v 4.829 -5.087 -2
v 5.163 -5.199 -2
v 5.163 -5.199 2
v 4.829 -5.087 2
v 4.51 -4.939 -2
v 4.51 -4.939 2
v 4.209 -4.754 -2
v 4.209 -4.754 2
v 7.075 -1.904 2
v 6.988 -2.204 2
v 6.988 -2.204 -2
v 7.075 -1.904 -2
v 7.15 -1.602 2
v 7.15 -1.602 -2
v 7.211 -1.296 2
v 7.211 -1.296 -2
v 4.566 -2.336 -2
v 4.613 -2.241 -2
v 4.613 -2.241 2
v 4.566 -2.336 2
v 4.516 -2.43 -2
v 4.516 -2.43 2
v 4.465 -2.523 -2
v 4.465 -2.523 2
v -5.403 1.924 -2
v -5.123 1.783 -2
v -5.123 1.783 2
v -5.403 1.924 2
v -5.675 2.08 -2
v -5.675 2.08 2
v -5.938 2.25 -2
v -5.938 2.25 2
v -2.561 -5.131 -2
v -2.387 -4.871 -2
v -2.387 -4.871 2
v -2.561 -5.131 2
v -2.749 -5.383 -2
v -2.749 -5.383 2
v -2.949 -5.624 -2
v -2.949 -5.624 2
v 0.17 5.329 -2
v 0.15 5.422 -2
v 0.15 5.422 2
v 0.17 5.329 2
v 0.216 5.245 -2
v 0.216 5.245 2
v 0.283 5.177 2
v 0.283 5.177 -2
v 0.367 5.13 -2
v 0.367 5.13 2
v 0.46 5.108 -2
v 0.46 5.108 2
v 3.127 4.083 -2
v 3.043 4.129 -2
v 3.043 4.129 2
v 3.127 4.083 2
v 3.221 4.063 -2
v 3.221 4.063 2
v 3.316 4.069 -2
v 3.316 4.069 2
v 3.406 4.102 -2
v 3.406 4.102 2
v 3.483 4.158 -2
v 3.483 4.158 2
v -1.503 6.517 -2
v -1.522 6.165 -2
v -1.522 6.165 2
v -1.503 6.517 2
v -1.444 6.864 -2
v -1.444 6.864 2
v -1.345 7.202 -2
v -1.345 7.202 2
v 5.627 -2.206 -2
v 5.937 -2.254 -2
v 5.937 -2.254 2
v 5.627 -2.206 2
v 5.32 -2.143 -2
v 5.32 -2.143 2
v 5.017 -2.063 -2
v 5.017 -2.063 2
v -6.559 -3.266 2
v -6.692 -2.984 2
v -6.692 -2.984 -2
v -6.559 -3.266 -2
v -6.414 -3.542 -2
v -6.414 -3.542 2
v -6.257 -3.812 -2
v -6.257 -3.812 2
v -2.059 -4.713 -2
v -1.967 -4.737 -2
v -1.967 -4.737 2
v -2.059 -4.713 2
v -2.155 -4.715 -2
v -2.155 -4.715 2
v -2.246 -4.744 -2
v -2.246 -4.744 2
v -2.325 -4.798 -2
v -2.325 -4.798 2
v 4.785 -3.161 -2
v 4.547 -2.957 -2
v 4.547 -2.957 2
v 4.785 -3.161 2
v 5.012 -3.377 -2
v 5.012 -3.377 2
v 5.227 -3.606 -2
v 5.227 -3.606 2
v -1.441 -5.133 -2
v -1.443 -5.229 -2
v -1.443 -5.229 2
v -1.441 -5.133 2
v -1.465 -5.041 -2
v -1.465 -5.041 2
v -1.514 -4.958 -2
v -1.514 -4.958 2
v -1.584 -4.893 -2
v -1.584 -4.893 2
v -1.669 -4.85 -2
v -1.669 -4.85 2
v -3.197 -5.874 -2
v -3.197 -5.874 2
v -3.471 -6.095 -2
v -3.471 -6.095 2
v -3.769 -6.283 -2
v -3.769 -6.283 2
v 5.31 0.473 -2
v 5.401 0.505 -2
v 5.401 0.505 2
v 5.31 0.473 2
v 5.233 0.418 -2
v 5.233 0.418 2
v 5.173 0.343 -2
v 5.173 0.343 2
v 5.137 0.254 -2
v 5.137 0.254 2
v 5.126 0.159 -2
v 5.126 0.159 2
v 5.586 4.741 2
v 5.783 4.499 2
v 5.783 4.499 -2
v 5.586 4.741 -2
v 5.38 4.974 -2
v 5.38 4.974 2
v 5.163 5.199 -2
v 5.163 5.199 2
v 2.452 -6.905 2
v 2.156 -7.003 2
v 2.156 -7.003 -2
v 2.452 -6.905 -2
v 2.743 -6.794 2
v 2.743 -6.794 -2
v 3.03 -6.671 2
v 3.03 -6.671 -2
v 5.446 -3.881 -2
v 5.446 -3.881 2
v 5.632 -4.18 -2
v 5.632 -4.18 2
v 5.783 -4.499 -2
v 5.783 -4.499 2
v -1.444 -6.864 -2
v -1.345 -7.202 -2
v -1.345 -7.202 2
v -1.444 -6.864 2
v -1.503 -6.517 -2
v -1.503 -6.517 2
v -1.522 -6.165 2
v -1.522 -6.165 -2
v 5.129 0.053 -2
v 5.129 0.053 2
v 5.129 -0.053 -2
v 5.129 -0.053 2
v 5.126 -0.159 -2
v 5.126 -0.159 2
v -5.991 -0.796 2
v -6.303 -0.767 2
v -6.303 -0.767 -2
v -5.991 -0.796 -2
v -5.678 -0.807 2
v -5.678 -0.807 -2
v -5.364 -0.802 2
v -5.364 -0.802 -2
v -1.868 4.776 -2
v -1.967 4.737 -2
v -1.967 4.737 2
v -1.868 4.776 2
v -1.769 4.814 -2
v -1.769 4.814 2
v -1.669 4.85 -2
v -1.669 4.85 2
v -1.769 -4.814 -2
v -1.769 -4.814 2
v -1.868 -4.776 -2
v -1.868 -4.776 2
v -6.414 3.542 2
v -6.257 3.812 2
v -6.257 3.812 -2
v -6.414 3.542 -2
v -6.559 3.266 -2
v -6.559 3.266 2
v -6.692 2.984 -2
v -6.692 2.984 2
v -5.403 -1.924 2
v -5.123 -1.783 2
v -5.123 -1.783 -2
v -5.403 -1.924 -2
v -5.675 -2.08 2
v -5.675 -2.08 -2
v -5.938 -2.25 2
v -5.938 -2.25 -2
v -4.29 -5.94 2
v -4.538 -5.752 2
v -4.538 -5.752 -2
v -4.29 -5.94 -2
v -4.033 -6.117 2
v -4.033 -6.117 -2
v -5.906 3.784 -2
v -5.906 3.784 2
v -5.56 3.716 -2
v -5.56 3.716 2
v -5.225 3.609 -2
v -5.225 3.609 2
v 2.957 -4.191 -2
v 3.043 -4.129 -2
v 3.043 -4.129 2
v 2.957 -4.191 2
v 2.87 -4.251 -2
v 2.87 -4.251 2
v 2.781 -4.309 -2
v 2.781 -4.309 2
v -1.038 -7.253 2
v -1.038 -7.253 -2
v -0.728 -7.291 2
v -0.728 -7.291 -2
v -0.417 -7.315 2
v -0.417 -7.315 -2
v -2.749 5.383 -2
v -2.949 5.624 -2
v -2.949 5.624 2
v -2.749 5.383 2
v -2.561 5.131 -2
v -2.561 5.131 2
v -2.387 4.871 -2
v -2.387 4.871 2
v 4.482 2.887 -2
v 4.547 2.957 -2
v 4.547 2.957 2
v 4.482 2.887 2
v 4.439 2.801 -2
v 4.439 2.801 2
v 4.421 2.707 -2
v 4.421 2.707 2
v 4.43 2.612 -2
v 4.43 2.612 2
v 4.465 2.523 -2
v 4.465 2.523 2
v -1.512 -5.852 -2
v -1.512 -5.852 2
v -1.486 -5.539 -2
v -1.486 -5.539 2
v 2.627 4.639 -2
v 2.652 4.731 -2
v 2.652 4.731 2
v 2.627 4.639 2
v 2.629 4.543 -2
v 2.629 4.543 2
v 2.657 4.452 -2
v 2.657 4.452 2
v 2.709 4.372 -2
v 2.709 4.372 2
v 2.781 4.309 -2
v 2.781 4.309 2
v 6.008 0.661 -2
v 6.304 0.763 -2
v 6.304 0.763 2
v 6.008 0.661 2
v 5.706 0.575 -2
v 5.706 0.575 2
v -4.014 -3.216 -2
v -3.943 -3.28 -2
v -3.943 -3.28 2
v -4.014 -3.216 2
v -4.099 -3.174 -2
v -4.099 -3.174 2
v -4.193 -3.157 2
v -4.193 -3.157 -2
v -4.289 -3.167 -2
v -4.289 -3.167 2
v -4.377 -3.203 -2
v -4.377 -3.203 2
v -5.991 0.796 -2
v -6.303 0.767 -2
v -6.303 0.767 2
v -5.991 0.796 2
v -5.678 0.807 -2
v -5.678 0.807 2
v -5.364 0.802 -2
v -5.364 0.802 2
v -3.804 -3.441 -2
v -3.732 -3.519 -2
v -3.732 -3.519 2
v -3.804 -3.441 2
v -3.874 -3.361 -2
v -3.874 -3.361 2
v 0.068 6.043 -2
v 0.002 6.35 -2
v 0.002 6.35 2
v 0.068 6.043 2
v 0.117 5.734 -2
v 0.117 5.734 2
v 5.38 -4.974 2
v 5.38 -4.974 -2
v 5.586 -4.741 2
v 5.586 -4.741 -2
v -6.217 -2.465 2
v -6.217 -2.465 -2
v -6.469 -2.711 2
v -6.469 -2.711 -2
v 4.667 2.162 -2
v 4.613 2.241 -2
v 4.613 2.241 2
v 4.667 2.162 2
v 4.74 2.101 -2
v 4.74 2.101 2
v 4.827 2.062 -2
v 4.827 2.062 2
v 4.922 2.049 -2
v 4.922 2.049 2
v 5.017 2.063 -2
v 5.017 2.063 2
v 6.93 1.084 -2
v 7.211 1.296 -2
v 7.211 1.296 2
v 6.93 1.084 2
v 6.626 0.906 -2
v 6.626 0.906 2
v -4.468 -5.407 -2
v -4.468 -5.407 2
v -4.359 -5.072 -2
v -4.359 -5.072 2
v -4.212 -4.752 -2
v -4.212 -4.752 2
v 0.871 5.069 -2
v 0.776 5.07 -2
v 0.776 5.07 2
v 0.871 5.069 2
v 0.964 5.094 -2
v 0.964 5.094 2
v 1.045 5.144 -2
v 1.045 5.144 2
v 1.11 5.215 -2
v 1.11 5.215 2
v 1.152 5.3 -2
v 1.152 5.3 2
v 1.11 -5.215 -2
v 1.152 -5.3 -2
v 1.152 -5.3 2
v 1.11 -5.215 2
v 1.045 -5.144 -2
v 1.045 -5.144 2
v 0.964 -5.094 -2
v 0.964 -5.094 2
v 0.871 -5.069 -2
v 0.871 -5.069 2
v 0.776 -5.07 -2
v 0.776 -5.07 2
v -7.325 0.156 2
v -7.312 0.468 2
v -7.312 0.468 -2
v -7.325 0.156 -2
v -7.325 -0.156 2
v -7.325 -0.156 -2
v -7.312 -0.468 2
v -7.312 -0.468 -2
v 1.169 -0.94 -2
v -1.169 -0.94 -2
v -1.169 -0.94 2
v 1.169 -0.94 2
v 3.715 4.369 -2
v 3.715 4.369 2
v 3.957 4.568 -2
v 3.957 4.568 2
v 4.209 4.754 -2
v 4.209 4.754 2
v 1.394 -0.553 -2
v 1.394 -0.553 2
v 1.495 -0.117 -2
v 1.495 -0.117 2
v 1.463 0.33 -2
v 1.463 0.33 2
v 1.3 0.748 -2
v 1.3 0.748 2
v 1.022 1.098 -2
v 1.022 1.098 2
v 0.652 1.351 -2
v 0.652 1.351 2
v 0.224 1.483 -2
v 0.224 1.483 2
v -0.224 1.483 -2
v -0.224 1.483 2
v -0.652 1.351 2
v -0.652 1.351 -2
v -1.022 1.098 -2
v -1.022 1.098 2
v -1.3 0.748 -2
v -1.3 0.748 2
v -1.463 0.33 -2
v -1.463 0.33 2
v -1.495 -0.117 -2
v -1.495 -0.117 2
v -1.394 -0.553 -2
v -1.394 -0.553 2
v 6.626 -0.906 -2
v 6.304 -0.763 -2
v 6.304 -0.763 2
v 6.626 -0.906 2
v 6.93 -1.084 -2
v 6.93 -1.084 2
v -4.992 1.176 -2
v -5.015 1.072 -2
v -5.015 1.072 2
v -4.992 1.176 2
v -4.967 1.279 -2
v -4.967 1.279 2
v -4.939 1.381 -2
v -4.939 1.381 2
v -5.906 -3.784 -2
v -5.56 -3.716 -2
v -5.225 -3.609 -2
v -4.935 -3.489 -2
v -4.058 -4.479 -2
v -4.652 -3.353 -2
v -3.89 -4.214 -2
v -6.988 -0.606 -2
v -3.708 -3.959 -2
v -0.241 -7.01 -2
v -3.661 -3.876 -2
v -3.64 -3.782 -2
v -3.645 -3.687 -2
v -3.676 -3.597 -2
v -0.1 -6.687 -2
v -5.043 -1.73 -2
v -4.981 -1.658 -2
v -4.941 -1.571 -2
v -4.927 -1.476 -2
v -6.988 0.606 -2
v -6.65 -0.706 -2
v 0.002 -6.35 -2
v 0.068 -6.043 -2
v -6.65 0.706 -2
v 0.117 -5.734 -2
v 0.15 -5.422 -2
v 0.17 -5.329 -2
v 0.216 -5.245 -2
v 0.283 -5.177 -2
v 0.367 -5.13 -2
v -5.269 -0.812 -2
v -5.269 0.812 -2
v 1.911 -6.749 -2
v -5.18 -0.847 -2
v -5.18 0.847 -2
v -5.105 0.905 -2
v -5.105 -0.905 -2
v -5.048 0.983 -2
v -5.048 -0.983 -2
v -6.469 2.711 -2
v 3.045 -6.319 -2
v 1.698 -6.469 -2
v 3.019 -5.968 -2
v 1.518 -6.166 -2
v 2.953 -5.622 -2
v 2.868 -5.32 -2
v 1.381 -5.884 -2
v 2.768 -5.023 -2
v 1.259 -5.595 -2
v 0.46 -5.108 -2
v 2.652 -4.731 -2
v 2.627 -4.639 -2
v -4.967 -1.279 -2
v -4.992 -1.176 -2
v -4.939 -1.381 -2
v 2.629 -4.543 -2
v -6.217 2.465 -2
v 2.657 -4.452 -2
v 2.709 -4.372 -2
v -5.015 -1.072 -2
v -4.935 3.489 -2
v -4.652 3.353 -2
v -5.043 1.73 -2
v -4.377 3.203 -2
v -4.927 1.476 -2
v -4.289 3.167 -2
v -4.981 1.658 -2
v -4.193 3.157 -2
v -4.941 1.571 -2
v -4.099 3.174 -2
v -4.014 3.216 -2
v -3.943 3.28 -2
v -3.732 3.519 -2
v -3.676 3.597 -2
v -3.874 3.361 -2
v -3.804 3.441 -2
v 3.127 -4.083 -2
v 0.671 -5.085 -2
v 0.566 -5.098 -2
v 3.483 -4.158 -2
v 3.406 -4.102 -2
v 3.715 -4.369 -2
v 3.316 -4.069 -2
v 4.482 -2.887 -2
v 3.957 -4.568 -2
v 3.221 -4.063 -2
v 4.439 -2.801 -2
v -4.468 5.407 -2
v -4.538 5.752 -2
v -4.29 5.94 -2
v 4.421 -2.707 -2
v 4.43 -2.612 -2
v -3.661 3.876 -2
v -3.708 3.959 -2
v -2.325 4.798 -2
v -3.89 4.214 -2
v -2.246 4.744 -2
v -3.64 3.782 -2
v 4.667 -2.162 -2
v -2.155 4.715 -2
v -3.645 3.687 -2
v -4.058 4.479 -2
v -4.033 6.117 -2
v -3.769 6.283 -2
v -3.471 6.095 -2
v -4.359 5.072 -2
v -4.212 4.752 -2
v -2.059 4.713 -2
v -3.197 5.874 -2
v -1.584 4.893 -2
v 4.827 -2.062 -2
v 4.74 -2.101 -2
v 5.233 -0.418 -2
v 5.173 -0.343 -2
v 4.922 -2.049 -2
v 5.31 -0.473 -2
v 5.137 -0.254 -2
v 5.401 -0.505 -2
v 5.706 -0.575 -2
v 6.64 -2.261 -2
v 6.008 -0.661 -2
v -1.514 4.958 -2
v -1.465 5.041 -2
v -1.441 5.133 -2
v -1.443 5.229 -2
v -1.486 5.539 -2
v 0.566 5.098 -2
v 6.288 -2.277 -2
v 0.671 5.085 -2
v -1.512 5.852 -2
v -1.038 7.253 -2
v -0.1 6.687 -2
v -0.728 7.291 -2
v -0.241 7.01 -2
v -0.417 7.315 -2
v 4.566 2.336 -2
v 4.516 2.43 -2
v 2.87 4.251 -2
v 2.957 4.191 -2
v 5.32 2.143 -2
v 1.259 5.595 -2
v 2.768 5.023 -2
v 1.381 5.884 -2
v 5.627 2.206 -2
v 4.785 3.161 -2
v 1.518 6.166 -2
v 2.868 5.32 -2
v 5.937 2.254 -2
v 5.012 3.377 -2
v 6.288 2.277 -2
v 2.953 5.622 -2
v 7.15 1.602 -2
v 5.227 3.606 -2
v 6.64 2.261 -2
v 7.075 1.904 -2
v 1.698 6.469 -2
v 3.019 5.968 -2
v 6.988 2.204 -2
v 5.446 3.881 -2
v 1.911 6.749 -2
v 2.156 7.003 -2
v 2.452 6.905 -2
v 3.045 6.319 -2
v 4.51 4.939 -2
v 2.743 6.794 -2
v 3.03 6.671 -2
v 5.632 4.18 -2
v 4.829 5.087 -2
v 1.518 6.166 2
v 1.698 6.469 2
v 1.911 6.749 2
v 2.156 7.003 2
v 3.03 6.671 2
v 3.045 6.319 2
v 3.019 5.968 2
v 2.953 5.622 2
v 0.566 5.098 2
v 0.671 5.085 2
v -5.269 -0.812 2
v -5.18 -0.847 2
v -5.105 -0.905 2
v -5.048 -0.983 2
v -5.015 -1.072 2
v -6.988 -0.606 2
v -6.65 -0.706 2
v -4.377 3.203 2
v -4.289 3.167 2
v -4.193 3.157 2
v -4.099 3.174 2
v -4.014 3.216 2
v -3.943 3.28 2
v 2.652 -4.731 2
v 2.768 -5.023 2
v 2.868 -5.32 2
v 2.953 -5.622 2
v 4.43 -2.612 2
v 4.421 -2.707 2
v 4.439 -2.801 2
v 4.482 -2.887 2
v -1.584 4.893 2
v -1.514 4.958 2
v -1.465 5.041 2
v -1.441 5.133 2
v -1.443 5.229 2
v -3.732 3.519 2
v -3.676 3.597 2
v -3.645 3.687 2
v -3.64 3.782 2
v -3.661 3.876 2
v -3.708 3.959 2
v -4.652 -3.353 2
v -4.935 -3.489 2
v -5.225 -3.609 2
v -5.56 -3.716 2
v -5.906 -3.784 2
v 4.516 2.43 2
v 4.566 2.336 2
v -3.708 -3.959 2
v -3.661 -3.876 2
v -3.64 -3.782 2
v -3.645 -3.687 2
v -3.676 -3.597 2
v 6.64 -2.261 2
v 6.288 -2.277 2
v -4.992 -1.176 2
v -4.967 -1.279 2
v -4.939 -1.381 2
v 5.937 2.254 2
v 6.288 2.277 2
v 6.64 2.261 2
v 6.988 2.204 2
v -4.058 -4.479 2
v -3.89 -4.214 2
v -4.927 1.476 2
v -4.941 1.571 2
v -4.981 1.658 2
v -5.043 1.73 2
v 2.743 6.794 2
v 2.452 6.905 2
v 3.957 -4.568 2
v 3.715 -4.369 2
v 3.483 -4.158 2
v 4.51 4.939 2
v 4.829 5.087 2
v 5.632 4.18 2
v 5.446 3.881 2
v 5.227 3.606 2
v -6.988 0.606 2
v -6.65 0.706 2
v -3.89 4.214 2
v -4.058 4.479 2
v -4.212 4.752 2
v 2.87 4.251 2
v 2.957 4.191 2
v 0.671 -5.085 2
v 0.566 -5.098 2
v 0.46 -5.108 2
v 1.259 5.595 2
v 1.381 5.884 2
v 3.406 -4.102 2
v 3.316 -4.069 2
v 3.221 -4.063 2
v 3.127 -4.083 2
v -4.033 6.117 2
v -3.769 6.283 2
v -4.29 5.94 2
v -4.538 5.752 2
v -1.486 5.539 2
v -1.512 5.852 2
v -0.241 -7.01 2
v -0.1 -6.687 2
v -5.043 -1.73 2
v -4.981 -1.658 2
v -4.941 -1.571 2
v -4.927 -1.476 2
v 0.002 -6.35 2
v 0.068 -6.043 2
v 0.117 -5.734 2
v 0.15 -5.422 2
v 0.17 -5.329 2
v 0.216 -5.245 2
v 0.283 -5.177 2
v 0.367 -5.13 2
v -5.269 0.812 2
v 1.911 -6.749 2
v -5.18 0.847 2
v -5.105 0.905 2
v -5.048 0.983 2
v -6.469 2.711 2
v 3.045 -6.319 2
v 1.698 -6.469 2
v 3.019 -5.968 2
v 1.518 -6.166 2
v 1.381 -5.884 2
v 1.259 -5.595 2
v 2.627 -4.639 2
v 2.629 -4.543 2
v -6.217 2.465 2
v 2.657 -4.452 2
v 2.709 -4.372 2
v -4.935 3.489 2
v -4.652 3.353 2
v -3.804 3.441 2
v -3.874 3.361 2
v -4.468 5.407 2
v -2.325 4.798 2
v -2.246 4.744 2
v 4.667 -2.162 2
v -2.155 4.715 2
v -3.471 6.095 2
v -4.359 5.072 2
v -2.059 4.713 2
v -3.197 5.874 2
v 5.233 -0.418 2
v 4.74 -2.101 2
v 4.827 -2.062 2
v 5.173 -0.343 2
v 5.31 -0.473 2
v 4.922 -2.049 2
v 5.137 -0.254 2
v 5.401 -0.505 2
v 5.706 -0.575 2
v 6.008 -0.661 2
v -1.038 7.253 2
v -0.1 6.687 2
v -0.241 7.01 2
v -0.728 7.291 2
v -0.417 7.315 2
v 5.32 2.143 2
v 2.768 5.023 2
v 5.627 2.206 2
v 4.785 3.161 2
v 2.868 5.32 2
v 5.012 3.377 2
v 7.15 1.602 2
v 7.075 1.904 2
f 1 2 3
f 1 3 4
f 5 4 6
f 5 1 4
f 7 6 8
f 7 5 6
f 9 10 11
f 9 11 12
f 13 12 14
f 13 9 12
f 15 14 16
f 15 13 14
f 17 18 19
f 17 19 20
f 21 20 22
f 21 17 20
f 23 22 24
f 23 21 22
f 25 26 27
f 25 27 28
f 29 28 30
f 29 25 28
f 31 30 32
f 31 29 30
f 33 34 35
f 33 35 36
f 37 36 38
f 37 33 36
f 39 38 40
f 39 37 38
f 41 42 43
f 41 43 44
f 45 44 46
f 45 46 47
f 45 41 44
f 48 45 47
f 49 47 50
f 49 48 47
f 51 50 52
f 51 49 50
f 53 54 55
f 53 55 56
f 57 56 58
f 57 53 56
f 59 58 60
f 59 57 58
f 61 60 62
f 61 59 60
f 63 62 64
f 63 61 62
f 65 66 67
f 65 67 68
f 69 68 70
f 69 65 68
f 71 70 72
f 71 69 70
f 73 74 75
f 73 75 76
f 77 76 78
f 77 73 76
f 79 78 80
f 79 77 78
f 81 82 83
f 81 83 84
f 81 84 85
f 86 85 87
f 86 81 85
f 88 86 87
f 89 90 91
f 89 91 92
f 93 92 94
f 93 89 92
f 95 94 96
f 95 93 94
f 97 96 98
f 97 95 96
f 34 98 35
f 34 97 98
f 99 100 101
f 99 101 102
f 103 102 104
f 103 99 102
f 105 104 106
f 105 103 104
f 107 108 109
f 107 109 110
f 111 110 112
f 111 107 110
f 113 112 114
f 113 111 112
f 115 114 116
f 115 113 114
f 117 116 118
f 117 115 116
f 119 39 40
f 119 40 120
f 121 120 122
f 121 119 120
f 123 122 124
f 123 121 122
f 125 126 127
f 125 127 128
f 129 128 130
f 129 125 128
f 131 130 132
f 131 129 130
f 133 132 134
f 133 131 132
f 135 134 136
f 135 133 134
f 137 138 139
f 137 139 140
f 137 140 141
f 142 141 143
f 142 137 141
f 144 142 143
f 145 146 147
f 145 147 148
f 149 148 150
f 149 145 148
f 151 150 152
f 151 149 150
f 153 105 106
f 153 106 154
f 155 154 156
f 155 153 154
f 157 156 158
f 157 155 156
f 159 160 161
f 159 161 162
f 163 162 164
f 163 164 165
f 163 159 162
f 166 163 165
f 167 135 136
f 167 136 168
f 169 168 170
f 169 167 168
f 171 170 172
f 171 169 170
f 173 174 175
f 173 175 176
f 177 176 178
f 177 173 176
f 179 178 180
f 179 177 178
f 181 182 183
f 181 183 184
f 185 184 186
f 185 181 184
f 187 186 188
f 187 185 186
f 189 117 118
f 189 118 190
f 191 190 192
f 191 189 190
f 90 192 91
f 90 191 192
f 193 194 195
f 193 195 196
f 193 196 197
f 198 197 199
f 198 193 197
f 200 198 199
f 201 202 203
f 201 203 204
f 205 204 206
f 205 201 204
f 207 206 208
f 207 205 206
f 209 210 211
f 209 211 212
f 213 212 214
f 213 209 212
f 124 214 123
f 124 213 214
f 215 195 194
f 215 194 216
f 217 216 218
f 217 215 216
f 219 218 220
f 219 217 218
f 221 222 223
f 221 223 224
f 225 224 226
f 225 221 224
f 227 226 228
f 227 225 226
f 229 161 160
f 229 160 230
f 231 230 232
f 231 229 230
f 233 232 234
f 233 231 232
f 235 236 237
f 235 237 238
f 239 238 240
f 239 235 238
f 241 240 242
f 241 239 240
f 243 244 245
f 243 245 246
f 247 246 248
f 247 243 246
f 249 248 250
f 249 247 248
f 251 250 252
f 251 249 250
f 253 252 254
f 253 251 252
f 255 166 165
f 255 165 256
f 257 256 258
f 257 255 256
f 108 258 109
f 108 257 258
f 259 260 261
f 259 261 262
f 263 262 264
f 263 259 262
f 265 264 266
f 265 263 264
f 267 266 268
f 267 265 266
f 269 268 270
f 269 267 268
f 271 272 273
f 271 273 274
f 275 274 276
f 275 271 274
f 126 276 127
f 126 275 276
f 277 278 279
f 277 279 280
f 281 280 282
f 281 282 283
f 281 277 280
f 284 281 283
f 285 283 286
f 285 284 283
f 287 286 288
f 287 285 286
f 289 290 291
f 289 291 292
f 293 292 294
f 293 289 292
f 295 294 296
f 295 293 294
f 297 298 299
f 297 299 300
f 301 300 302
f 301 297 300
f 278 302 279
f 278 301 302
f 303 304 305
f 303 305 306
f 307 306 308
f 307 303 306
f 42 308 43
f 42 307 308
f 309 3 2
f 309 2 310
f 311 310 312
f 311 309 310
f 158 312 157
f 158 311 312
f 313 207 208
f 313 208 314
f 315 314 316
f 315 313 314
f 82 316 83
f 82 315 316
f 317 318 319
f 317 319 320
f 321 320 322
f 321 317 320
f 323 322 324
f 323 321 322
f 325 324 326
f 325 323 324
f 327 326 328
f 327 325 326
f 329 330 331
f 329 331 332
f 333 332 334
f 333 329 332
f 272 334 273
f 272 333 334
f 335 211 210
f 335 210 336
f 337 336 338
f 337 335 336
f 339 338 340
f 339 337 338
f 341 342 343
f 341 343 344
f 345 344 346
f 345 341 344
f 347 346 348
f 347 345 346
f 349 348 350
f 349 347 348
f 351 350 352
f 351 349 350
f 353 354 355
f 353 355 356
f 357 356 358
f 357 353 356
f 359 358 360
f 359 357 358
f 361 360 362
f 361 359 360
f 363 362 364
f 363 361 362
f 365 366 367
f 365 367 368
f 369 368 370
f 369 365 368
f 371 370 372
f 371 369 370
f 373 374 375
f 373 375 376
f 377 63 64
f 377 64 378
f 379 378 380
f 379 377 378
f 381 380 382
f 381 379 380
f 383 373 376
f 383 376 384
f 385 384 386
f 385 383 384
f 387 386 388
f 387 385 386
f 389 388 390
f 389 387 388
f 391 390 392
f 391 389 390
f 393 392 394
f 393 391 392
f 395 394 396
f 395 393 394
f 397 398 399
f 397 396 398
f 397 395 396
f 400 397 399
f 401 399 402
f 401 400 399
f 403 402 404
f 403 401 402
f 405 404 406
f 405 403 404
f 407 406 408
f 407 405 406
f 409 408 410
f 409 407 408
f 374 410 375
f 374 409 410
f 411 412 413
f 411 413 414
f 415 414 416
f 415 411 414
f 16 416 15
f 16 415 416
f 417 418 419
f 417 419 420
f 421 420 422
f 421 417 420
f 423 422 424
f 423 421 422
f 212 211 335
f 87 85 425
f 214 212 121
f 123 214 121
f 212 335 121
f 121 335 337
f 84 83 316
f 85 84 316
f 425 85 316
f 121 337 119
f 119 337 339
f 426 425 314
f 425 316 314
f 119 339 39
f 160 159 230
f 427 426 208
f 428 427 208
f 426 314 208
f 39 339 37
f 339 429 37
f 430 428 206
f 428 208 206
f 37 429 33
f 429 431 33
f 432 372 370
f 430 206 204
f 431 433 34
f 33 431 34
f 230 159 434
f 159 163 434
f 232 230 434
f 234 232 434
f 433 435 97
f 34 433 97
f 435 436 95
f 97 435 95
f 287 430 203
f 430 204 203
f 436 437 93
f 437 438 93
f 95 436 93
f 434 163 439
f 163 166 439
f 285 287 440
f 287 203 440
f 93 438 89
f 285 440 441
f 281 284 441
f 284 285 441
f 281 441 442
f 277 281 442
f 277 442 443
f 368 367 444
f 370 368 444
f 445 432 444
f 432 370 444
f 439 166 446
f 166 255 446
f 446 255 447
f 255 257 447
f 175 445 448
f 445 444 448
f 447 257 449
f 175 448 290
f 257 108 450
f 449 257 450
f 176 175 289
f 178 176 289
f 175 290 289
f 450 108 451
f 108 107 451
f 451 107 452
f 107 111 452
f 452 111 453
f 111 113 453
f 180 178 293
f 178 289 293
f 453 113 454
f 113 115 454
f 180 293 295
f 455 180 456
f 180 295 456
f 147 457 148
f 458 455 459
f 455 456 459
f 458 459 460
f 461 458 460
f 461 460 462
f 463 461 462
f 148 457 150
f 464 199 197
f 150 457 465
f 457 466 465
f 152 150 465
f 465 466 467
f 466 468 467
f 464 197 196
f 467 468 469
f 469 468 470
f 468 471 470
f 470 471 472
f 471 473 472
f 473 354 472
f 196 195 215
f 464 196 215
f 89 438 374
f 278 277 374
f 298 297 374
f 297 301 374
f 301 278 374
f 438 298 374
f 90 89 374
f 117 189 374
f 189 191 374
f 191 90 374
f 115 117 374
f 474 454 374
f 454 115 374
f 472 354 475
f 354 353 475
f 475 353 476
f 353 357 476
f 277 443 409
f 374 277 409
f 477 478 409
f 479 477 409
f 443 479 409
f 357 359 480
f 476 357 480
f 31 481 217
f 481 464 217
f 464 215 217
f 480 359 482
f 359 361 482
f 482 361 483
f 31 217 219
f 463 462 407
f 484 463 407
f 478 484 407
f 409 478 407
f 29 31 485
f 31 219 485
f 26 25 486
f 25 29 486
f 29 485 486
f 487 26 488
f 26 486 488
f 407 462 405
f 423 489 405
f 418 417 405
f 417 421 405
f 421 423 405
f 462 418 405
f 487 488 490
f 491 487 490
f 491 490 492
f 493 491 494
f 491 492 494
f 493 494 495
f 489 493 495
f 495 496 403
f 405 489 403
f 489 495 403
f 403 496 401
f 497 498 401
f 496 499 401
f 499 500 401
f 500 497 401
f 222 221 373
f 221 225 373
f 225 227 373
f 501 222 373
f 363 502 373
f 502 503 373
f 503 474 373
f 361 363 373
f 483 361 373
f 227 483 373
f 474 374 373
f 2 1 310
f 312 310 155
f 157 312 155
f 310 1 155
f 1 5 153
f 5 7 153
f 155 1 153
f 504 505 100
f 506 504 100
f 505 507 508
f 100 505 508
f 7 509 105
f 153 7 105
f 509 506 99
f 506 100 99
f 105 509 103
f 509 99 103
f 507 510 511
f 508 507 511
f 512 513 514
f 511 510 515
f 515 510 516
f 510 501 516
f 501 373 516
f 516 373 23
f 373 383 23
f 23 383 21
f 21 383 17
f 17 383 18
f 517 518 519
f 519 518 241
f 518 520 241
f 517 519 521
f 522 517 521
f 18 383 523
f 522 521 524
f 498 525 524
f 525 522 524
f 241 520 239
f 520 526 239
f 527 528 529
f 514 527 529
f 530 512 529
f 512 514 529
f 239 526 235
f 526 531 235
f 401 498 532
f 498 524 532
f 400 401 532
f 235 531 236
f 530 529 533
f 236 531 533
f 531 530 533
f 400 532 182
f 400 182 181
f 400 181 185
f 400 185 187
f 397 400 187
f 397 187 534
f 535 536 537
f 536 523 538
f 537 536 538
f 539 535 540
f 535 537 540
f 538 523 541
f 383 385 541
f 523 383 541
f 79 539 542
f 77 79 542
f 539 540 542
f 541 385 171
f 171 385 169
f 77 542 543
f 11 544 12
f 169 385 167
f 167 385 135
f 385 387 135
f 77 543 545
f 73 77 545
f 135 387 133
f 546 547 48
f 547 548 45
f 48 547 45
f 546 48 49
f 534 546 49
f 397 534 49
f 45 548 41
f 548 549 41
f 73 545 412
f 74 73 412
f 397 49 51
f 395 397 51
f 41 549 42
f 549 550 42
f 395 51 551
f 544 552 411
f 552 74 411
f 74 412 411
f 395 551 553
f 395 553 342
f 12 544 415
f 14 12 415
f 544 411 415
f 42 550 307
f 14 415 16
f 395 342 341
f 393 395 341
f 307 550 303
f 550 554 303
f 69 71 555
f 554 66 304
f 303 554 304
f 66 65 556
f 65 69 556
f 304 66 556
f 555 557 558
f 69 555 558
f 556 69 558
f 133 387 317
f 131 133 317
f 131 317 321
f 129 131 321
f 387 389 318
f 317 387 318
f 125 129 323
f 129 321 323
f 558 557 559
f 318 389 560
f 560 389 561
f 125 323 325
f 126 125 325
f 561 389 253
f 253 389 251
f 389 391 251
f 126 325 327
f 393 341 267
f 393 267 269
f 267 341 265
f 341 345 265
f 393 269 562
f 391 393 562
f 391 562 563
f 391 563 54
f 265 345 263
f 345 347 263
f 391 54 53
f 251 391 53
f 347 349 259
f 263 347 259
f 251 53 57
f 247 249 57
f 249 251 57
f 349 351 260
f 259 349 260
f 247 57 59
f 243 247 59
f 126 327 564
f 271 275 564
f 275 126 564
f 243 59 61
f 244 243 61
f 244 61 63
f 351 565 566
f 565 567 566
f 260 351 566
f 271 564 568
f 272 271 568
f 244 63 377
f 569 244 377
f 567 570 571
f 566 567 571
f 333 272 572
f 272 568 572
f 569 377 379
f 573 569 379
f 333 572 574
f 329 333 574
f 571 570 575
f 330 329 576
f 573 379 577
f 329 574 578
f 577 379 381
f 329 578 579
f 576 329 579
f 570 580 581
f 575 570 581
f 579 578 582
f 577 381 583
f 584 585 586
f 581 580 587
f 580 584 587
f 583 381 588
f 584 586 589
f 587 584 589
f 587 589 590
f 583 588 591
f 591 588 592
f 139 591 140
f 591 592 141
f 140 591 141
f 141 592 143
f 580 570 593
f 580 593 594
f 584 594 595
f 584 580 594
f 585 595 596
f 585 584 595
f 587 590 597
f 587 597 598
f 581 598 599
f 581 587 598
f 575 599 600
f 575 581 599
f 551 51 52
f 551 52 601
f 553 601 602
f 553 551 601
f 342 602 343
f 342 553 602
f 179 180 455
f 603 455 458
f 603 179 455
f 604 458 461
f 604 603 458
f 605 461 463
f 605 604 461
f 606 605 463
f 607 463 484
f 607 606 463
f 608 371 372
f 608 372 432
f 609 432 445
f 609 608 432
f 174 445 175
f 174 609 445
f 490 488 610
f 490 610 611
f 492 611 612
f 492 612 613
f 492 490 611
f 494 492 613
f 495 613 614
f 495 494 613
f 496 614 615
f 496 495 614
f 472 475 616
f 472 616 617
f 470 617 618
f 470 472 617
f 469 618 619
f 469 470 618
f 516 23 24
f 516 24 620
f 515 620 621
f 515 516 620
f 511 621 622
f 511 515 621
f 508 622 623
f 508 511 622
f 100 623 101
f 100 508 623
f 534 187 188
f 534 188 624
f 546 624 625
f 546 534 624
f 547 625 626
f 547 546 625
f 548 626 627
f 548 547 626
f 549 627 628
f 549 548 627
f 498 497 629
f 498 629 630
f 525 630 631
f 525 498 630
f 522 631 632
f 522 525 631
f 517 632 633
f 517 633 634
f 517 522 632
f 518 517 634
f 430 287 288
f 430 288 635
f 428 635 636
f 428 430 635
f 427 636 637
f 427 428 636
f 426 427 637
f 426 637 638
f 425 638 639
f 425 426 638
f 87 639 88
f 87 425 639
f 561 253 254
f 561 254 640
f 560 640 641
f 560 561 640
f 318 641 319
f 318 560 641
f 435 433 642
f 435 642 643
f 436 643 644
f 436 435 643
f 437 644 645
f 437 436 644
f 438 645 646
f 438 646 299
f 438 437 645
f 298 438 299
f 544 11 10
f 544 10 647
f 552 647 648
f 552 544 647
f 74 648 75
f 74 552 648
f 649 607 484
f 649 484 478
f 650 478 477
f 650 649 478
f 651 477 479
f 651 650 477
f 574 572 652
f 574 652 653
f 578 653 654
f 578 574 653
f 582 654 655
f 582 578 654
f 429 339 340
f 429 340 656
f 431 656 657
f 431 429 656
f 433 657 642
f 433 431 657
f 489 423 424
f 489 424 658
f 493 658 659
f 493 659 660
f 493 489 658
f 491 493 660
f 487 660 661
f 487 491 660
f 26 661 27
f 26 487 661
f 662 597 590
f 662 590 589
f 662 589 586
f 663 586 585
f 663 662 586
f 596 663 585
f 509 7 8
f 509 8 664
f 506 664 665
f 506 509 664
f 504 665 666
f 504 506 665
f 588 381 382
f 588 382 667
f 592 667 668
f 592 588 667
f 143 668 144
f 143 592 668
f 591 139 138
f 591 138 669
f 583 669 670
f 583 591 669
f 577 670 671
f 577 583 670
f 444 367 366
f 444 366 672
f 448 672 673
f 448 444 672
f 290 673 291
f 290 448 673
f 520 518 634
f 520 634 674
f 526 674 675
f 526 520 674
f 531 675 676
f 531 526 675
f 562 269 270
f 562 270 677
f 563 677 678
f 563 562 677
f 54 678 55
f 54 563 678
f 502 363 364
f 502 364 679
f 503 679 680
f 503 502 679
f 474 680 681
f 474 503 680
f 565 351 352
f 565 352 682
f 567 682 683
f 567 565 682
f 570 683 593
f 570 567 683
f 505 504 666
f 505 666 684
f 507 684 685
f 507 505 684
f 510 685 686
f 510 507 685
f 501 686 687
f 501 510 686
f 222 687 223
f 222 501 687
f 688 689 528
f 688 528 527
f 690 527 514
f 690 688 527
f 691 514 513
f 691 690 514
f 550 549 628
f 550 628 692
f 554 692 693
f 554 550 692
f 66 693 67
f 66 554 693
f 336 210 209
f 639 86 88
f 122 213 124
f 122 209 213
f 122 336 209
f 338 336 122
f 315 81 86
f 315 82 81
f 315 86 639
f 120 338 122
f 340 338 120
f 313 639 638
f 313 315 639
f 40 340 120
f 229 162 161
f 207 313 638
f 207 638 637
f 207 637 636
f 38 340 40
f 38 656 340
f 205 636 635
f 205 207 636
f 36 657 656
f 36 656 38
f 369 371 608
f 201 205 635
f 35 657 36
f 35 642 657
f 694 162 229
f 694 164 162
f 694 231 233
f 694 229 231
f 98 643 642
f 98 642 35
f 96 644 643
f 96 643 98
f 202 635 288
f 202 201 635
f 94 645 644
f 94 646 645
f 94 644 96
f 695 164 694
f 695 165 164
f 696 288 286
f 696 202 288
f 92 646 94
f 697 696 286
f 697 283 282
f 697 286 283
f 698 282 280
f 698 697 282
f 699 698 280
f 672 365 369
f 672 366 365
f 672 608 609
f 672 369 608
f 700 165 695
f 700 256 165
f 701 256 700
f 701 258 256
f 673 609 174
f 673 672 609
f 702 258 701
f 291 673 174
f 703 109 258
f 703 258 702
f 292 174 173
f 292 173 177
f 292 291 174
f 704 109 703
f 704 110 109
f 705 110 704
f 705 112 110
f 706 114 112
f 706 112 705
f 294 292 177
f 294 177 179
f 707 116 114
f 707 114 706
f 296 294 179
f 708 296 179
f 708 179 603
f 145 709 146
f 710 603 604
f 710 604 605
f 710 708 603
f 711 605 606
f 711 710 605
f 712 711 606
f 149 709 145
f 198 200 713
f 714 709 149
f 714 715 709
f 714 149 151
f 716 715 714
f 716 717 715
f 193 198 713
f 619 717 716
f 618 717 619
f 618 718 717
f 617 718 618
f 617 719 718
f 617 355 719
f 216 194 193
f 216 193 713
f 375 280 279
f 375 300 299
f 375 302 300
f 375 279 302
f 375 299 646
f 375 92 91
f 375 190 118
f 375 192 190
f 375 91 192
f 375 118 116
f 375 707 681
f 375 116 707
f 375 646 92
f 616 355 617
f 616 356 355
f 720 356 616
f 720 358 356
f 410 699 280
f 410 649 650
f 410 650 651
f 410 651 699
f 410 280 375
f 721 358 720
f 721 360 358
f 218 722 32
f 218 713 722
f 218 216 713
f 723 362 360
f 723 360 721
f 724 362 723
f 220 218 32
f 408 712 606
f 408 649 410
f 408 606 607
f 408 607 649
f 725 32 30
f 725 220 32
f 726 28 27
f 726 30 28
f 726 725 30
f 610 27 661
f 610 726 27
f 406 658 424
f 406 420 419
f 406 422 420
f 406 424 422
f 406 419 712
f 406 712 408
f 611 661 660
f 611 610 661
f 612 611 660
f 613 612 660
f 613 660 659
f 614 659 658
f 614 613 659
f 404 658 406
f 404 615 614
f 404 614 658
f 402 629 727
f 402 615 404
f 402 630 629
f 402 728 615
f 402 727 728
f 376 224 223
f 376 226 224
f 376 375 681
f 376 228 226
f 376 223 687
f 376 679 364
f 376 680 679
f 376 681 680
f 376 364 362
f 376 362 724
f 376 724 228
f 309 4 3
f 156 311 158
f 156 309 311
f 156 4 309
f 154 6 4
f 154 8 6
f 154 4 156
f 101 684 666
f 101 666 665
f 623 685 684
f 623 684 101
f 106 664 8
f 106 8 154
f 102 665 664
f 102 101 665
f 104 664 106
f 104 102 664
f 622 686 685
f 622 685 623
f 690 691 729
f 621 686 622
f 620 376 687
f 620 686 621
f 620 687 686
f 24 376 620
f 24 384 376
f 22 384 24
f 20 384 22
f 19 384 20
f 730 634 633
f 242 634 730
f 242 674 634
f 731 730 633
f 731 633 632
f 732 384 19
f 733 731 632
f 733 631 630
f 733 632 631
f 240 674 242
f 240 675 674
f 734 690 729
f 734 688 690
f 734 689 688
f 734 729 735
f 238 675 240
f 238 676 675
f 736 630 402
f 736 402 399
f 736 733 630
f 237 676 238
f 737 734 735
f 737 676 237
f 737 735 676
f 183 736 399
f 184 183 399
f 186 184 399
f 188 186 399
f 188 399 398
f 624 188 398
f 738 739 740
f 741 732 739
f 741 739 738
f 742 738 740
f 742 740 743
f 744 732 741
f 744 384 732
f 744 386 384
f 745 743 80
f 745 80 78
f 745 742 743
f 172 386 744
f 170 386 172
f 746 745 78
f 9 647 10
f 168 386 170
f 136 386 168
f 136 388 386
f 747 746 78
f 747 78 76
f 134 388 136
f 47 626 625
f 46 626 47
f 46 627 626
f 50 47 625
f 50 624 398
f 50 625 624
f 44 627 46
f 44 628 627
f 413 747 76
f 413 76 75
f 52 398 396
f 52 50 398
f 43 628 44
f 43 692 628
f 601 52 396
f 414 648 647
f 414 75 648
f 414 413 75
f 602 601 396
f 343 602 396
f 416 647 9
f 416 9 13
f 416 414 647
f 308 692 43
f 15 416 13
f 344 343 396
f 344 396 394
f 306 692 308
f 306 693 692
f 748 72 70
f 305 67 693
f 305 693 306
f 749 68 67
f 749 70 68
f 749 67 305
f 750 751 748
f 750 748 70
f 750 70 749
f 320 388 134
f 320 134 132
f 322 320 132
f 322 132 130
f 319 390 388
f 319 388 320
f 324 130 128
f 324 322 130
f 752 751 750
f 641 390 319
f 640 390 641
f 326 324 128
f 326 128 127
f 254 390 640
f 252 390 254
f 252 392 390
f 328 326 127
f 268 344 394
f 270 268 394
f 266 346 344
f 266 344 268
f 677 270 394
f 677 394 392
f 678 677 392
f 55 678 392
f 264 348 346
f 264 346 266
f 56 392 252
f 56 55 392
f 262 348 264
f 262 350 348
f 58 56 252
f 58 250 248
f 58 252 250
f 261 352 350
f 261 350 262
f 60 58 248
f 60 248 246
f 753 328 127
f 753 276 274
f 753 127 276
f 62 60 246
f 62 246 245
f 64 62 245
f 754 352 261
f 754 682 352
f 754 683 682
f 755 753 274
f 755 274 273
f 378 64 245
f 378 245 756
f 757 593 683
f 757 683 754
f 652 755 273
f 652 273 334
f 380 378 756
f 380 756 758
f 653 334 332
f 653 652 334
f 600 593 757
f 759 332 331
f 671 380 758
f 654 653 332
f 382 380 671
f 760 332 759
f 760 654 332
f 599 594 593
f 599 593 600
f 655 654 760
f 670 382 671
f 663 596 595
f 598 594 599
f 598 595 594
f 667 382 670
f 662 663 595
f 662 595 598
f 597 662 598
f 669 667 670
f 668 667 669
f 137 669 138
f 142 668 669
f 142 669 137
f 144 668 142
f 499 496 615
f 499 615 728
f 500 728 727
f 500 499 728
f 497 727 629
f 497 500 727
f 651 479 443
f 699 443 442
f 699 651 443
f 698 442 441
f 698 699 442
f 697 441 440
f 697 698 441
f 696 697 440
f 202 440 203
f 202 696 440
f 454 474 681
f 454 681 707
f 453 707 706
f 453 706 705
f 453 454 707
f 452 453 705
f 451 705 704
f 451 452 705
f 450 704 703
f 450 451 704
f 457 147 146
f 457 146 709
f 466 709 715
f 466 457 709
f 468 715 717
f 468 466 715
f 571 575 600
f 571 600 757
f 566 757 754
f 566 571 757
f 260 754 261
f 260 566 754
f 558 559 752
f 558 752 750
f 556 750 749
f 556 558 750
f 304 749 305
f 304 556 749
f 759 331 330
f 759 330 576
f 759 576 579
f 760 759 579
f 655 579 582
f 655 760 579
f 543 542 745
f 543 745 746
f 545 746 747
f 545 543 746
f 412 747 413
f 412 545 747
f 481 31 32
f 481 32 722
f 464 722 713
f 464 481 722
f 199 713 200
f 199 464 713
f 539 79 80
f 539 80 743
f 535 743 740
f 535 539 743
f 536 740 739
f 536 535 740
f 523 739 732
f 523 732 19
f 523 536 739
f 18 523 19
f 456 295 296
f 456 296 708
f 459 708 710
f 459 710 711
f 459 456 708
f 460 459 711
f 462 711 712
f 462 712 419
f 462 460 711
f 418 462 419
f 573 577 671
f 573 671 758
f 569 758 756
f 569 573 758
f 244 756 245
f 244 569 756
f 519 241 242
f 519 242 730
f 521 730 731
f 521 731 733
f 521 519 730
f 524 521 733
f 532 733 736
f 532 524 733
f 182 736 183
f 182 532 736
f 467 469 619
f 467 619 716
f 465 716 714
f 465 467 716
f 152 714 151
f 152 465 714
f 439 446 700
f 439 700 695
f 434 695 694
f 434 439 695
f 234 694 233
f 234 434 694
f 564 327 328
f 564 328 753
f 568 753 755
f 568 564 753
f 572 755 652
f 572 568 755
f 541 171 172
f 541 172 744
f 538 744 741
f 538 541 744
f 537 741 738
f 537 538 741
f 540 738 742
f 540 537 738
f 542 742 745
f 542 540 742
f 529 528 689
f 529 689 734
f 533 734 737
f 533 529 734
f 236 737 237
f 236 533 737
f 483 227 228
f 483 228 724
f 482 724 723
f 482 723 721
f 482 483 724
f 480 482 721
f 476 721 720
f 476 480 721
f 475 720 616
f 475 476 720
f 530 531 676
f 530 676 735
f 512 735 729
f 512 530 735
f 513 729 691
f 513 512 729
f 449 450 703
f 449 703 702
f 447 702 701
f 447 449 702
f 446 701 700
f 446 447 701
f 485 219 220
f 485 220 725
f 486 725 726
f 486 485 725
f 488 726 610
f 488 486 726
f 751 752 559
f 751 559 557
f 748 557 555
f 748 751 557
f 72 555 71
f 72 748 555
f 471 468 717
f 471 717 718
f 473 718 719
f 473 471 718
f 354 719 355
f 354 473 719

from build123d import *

# Parameters (mm, degrees)
SKETCH1_R                = 7.326923077
BLANK_DISK_DEPTH         = 2.000000064
GEAR_TOOTH_CUT_DEPTH     = 12.107097036
GEAR_TEETH_REVOLVE_COUNT = 13
SKETCH4_R                = 0.75
HUB_EXTRUDE_DEPTH        = 0.635
HEX_BORE_CUT_DEPTH       = 12.099256277
HEX_BORE_CUT_DEPTH_BACK  = 12.099256277


with BuildPart() as part:
    # Sketch1 → BLANK DISK (new, symmetric)
    with BuildSketch(Plane.XY):
        Circle(SKETCH1_R)
    extrude(amount=BLANK_DISK_DEPTH, both=True)

    # Sketch2 → GEAR TOOTH CUT (cut, through all)
    with BuildSketch(Plane.XY.offset(2.000000064)):
        with BuildLine():
            ThreePointArc((-6.69170719, -2.984100644), (-7.114016008, -1.753447463), (-7.311993171, -0.467501495))
            ThreePointArc((-7.311993171, -0.467501495), (-6.820672406, -0.660972702), (-6.303462426, -0.767373077))
            ThreePointArc((-6.303462426, -0.767373077), (-5.834645763, -0.80350314), (-5.364440786, -0.802189535))
            ThreePointArc((-5.364440786, -0.802189535), (-5.140559328, -0.873425337), (-5.015496519, -1.072314102))
            ThreePointArc((-5.015496519, -1.072314102), (-4.979811206, -1.227413224), (-4.939330826, -1.381330469))
            ThreePointArc((-4.939330826, -1.381330469), (-4.957640225, -1.615557309), (-5.122772484, -1.782676381))
            ThreePointArc((-5.122772484, -1.782676381), (-5.539728776, -2.000028389), (-5.938054838, -2.249889939))
            ThreePointArc((-5.938054838, -2.249889939), (-6.346574811, -2.584462254), (-6.69170719, -2.984100644))
        make_face()
    gear_tooth_cut = extrude(amount=-GEAR_TOOTH_CUT_DEPTH, mode=Mode.SUBTRACT)

    # GEAR TEETH REVOLVE: GEAR TOOTH CUT ×13 about axis
    gear_teeth_revolve_axis = Axis((0, 0, 50), (0, 0, -1))
    for i in range(1, GEAR_TEETH_REVOLVE_COUNT):
        add(gear_tooth_cut.rotate(gear_teeth_revolve_axis, i * 360 / GEAR_TEETH_REVOLVE_COUNT), mode=Mode.SUBTRACT)

    # Sketch4 → Hub Extrude (add)
    with BuildSketch(Plane.XY.offset(2.000000064)):
        Circle(SKETCH4_R)
    extrude(amount=HUB_EXTRUDE_DEPTH)

    # Sketch3 → HEX BORE CUT (cut, two sides: drawn at the far end of the back side and taken through both)
    with BuildSketch(Plane.XY.offset(2.000000064).offset(-HEX_BORE_CUT_DEPTH_BACK)):
        with BuildLine():
            Line((-1.168931136, -0.94), (1.168931136, -0.94))
            ThreePointArc((1.168931136, -0.94), (0, 1.5), (-1.168931136, -0.94))
        make_face()
    extrude(amount=HEX_BORE_CUT_DEPTH + HEX_BORE_CUT_DEPTH_BACK, mode=Mode.SUBTRACT)


solid = part.part
